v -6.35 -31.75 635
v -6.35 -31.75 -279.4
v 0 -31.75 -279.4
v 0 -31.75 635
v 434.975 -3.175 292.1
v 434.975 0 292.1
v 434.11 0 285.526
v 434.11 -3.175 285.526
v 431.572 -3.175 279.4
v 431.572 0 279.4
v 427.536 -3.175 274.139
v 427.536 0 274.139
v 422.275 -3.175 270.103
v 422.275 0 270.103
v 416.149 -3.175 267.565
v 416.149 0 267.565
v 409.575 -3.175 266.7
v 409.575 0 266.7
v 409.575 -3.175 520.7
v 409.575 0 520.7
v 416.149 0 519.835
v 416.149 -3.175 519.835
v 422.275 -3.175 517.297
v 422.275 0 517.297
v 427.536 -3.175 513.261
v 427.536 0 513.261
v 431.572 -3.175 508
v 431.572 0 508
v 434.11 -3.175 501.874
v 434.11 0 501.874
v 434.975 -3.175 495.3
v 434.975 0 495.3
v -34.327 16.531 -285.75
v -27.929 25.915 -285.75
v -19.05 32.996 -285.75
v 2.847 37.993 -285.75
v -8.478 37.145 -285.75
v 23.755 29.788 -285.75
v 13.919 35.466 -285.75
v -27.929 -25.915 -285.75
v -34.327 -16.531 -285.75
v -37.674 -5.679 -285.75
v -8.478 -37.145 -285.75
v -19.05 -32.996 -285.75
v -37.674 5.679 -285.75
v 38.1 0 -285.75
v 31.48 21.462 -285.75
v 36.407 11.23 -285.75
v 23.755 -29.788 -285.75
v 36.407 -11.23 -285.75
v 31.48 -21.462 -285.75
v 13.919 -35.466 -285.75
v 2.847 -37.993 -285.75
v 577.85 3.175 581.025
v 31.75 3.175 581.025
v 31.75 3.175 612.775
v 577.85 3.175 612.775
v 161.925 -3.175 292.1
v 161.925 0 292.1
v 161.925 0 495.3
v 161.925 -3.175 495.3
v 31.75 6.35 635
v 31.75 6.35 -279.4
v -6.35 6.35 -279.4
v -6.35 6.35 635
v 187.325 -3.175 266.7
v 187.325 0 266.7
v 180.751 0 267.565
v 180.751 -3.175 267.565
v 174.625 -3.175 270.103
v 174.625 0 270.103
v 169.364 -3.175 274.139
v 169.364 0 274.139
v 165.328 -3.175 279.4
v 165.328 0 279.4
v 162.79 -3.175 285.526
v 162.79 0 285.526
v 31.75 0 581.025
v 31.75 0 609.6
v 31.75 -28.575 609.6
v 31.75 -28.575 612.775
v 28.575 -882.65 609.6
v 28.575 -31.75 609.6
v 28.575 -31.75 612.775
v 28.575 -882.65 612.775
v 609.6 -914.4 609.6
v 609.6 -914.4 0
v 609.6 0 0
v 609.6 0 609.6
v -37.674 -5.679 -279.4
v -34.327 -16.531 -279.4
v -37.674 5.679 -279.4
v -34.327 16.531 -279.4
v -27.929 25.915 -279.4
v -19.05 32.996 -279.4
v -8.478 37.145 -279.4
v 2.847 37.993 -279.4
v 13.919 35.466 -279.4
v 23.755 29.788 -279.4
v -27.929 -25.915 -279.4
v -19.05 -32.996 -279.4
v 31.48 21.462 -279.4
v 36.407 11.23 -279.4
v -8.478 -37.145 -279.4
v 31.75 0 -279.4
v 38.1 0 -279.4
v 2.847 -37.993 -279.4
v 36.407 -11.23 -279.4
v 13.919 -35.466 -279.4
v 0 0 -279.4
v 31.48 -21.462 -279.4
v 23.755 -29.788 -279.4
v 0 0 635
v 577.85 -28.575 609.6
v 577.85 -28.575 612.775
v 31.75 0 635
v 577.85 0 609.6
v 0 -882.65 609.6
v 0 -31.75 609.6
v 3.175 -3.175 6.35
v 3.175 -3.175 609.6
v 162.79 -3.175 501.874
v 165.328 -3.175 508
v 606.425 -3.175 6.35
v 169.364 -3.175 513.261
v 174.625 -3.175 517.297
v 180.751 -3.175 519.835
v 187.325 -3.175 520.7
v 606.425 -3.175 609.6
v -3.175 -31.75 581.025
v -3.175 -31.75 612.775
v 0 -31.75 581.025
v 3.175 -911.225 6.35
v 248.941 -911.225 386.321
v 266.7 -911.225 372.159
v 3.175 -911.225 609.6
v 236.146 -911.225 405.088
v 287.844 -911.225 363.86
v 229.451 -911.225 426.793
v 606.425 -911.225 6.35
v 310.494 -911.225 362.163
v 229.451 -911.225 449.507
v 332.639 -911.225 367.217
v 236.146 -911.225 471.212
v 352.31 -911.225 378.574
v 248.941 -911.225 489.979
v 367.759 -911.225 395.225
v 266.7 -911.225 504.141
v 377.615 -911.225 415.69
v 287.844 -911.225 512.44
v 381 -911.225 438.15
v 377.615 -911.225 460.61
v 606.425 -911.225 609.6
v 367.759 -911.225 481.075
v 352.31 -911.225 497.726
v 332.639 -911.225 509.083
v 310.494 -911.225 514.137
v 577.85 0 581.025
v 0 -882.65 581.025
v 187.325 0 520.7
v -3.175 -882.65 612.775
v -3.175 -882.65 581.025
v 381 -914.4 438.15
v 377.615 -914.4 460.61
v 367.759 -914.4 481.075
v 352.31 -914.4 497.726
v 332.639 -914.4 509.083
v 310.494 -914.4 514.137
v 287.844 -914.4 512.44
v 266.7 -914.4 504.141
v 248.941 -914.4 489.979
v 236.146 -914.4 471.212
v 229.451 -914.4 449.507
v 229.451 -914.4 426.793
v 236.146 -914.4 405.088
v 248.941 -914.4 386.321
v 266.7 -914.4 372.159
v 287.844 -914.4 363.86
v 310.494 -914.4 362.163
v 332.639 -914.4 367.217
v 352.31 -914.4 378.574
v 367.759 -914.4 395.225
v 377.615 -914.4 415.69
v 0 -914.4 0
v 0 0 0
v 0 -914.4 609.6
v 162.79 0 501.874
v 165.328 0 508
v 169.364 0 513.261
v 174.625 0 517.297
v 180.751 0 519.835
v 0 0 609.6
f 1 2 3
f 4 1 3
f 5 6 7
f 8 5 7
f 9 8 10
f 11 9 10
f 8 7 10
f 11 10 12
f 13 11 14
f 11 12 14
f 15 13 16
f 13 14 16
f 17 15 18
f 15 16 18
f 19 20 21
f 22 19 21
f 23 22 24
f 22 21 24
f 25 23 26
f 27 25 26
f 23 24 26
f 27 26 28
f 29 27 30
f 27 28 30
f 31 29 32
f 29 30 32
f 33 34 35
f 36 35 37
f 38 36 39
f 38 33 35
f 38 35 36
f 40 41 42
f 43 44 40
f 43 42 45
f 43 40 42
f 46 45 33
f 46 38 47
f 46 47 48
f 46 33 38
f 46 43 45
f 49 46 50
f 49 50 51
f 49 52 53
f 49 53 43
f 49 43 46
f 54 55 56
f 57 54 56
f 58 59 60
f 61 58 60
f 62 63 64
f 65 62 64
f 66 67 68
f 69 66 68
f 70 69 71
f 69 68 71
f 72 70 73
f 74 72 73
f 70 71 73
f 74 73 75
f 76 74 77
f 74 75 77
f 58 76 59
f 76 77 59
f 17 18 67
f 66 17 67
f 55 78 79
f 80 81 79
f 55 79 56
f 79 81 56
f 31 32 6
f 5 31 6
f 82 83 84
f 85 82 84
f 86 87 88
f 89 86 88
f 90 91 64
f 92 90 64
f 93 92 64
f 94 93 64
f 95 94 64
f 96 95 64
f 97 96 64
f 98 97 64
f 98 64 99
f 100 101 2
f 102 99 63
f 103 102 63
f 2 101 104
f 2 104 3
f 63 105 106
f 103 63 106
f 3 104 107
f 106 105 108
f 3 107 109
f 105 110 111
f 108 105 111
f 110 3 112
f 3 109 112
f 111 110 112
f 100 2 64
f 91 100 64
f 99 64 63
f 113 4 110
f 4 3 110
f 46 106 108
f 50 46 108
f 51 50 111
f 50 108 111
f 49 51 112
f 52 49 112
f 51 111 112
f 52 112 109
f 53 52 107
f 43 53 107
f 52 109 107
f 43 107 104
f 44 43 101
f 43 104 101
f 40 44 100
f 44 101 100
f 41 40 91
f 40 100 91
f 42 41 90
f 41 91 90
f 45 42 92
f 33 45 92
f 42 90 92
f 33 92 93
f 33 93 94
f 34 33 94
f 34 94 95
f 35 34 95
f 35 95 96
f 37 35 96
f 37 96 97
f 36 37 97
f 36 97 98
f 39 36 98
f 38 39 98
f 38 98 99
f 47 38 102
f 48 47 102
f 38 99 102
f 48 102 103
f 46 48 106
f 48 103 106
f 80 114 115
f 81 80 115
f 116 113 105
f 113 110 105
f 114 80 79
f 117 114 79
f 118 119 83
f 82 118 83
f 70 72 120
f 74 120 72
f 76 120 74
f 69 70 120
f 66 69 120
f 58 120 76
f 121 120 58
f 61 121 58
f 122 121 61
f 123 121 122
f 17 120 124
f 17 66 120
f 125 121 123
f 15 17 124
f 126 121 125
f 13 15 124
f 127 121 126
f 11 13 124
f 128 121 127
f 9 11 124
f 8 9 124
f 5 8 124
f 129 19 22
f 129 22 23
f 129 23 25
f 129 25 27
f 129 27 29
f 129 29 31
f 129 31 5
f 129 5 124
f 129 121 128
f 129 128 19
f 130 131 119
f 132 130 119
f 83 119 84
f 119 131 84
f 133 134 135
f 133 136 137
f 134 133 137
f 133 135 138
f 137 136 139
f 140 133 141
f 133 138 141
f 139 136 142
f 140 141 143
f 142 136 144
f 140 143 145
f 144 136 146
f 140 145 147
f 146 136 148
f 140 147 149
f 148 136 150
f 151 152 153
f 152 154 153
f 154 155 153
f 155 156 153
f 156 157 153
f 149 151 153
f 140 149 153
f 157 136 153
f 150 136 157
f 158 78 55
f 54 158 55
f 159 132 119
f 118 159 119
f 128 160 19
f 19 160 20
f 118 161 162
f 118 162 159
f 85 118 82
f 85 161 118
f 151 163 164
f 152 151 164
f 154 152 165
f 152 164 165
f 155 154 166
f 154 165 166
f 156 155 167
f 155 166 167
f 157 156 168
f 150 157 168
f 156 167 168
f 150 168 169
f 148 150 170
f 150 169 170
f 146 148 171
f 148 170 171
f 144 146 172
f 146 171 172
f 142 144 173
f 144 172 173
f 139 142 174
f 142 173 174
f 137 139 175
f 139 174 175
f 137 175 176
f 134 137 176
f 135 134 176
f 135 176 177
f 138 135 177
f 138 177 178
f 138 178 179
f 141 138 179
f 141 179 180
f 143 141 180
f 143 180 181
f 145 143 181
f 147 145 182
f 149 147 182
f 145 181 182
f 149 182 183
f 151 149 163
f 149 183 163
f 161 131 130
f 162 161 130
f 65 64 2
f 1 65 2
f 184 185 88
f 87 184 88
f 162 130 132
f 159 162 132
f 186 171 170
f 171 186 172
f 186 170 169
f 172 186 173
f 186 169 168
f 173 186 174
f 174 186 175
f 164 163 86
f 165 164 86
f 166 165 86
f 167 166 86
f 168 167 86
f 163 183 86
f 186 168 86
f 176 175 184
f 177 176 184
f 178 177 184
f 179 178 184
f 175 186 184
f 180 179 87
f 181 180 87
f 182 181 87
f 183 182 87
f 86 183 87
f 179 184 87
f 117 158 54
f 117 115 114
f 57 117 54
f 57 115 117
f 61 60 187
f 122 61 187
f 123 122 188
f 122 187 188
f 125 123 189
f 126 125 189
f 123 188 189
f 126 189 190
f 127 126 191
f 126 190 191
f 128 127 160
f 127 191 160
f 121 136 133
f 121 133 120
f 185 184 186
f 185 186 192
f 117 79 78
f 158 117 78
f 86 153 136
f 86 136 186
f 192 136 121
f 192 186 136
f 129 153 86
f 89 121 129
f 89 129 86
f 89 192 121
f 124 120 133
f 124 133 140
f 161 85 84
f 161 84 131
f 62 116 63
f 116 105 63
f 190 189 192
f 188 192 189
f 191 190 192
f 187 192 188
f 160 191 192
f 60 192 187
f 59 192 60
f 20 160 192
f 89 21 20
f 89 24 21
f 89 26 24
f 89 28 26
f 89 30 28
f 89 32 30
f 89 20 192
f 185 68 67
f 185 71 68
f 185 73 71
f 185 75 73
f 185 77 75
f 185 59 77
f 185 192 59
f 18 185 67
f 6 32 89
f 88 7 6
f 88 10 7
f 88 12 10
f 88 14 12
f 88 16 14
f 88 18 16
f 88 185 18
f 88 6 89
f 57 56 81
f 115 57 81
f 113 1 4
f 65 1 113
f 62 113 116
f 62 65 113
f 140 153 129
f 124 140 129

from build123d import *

# Parameters (mm, degrees)
F0_W      = 609.6
F0_H      = 914.4
F1_DEPTH  = 609.6
F2_W      = 603.25
F2_H      = 908.05
F3_DEPTH  = 603.25
F4_R      = 76.2
F5_DEPTH  = 3.175
F7_DEPTH  = 889
F8_DEPTH  = 25.4
F9_R      = 38.1
F10_DEPTH = 6.35
F12_DEPTH = 3.175
F13_W     = 28.575
F13_H     = 3.175
F14_DEPTH = 546.1
F15_W     = 28.575
F15_H     = 3.175
F16_DEPTH = 850.9


with BuildPart() as f1:
    # F0 (on Top) → F1 (new body)
    with BuildSketch(Plane.XY):
        with Locations((304.8, -457.2)):
            Rectangle(F0_W, F0_H)
    extrude(amount=F1_DEPTH)

    # F2 (on face) → F3 (cut)
    with BuildSketch(Plane.XY.offset(609.6)):
        with Locations((304.8, -457.2)):
            Rectangle(F2_W, F2_H)
    extrude(amount=-F3_DEPTH, mode=Mode.SUBTRACT)

    # F4 (on face) → F5 (cut)
    with BuildSketch(Plane.XZ.offset(914.4)):
        with Locations((304.8, 438.15)):
            Circle(F4_R)
    extrude(amount=-F5_DEPTH, mode=Mode.SUBTRACT)

    # F11 (on face) → F12 (cut)
    with BuildSketch(Plane(origin=(0, 0, 0), x_dir=(-1, 0, 0), z_dir=(0, 1, 0))):
        with BuildLine():
            Line((-187.325, 520.7), (-409.575, 520.7))
            ThreePointArc((-409.575, 520.7), (-427.5355122421, 513.2605122421), (-434.975, 495.3))
            Line((-434.975, 495.3), (-434.975, 292.1))
            ThreePointArc((-434.975, 292.1), (-427.5355122421, 274.1394877579), (-409.575, 266.7))
            Line((-409.575, 266.7), (-187.325, 266.7))
            ThreePointArc((-187.325, 266.7), (-169.3644877579, 274.1394877579), (-161.925, 292.1))
            Line((-161.925, 292.1), (-161.925, 495.3))
            ThreePointArc((-161.925, 495.3), (-169.3644877579, 513.2605122421), (-187.325, 520.7))
        make_face()
    extrude(amount=-F12_DEPTH, mode=Mode.SUBTRACT)


with BuildPart() as f7:
    # F6 (on face) → F7 (new body)
    with BuildSketch(Plane.XY.offset(609.6)):
        Polygon((-6.35, -31.75), (0, -31.75), (0, 0), (31.75, 0), (31.75, 6.35), (-6.35, 6.35), align=None)
    extrude(amount=-F7_DEPTH)

    # F8 (add): a face of the model
    f8_faces = [f7.faces().sort_by_distance(p)[0] for p in [
        (-5.8111846327, -12.7, 609.6),
    ]]
    extrude(f8_faces, amount=F8_DEPTH)

    # F9 (on face) → F10 (join)
    with BuildSketch(Plane(origin=(0, 0, -279.4), x_dir=(1, 0, 0), z_dir=(0, 0, -1))):
        Circle(F9_R)
    extrude(amount=F10_DEPTH)


with BuildPart() as f14:
    # F13 (on face) → F14 (new body)
    with BuildSketch(Plane.YZ.offset(31.75)):
        Polygon((0, 609.6), (0, 581.025), (3.175, 581.025), (3.175, 612.775), (0, 612.775), align=None)
        with Locations((-14.2875, 611.1875)):
            Rectangle(F13_W, F13_H)
    extrude(amount=F14_DEPTH)


with BuildPart() as f16:
    # F15 (on face) → F16 (new body)
    with BuildSketch(Plane.XZ.offset(31.75)):
        Polygon((0, 581.025), (0, 609.6), (0, 612.775), (-3.175, 612.775), (-3.175, 581.025), align=None)
        with Locations((14.2875, 611.1875)):
            Rectangle(F15_W, F15_H)
    extrude(amount=F16_DEPTH)


solid = Compound([f1.part, f7.part, f14.part, f16.part])
